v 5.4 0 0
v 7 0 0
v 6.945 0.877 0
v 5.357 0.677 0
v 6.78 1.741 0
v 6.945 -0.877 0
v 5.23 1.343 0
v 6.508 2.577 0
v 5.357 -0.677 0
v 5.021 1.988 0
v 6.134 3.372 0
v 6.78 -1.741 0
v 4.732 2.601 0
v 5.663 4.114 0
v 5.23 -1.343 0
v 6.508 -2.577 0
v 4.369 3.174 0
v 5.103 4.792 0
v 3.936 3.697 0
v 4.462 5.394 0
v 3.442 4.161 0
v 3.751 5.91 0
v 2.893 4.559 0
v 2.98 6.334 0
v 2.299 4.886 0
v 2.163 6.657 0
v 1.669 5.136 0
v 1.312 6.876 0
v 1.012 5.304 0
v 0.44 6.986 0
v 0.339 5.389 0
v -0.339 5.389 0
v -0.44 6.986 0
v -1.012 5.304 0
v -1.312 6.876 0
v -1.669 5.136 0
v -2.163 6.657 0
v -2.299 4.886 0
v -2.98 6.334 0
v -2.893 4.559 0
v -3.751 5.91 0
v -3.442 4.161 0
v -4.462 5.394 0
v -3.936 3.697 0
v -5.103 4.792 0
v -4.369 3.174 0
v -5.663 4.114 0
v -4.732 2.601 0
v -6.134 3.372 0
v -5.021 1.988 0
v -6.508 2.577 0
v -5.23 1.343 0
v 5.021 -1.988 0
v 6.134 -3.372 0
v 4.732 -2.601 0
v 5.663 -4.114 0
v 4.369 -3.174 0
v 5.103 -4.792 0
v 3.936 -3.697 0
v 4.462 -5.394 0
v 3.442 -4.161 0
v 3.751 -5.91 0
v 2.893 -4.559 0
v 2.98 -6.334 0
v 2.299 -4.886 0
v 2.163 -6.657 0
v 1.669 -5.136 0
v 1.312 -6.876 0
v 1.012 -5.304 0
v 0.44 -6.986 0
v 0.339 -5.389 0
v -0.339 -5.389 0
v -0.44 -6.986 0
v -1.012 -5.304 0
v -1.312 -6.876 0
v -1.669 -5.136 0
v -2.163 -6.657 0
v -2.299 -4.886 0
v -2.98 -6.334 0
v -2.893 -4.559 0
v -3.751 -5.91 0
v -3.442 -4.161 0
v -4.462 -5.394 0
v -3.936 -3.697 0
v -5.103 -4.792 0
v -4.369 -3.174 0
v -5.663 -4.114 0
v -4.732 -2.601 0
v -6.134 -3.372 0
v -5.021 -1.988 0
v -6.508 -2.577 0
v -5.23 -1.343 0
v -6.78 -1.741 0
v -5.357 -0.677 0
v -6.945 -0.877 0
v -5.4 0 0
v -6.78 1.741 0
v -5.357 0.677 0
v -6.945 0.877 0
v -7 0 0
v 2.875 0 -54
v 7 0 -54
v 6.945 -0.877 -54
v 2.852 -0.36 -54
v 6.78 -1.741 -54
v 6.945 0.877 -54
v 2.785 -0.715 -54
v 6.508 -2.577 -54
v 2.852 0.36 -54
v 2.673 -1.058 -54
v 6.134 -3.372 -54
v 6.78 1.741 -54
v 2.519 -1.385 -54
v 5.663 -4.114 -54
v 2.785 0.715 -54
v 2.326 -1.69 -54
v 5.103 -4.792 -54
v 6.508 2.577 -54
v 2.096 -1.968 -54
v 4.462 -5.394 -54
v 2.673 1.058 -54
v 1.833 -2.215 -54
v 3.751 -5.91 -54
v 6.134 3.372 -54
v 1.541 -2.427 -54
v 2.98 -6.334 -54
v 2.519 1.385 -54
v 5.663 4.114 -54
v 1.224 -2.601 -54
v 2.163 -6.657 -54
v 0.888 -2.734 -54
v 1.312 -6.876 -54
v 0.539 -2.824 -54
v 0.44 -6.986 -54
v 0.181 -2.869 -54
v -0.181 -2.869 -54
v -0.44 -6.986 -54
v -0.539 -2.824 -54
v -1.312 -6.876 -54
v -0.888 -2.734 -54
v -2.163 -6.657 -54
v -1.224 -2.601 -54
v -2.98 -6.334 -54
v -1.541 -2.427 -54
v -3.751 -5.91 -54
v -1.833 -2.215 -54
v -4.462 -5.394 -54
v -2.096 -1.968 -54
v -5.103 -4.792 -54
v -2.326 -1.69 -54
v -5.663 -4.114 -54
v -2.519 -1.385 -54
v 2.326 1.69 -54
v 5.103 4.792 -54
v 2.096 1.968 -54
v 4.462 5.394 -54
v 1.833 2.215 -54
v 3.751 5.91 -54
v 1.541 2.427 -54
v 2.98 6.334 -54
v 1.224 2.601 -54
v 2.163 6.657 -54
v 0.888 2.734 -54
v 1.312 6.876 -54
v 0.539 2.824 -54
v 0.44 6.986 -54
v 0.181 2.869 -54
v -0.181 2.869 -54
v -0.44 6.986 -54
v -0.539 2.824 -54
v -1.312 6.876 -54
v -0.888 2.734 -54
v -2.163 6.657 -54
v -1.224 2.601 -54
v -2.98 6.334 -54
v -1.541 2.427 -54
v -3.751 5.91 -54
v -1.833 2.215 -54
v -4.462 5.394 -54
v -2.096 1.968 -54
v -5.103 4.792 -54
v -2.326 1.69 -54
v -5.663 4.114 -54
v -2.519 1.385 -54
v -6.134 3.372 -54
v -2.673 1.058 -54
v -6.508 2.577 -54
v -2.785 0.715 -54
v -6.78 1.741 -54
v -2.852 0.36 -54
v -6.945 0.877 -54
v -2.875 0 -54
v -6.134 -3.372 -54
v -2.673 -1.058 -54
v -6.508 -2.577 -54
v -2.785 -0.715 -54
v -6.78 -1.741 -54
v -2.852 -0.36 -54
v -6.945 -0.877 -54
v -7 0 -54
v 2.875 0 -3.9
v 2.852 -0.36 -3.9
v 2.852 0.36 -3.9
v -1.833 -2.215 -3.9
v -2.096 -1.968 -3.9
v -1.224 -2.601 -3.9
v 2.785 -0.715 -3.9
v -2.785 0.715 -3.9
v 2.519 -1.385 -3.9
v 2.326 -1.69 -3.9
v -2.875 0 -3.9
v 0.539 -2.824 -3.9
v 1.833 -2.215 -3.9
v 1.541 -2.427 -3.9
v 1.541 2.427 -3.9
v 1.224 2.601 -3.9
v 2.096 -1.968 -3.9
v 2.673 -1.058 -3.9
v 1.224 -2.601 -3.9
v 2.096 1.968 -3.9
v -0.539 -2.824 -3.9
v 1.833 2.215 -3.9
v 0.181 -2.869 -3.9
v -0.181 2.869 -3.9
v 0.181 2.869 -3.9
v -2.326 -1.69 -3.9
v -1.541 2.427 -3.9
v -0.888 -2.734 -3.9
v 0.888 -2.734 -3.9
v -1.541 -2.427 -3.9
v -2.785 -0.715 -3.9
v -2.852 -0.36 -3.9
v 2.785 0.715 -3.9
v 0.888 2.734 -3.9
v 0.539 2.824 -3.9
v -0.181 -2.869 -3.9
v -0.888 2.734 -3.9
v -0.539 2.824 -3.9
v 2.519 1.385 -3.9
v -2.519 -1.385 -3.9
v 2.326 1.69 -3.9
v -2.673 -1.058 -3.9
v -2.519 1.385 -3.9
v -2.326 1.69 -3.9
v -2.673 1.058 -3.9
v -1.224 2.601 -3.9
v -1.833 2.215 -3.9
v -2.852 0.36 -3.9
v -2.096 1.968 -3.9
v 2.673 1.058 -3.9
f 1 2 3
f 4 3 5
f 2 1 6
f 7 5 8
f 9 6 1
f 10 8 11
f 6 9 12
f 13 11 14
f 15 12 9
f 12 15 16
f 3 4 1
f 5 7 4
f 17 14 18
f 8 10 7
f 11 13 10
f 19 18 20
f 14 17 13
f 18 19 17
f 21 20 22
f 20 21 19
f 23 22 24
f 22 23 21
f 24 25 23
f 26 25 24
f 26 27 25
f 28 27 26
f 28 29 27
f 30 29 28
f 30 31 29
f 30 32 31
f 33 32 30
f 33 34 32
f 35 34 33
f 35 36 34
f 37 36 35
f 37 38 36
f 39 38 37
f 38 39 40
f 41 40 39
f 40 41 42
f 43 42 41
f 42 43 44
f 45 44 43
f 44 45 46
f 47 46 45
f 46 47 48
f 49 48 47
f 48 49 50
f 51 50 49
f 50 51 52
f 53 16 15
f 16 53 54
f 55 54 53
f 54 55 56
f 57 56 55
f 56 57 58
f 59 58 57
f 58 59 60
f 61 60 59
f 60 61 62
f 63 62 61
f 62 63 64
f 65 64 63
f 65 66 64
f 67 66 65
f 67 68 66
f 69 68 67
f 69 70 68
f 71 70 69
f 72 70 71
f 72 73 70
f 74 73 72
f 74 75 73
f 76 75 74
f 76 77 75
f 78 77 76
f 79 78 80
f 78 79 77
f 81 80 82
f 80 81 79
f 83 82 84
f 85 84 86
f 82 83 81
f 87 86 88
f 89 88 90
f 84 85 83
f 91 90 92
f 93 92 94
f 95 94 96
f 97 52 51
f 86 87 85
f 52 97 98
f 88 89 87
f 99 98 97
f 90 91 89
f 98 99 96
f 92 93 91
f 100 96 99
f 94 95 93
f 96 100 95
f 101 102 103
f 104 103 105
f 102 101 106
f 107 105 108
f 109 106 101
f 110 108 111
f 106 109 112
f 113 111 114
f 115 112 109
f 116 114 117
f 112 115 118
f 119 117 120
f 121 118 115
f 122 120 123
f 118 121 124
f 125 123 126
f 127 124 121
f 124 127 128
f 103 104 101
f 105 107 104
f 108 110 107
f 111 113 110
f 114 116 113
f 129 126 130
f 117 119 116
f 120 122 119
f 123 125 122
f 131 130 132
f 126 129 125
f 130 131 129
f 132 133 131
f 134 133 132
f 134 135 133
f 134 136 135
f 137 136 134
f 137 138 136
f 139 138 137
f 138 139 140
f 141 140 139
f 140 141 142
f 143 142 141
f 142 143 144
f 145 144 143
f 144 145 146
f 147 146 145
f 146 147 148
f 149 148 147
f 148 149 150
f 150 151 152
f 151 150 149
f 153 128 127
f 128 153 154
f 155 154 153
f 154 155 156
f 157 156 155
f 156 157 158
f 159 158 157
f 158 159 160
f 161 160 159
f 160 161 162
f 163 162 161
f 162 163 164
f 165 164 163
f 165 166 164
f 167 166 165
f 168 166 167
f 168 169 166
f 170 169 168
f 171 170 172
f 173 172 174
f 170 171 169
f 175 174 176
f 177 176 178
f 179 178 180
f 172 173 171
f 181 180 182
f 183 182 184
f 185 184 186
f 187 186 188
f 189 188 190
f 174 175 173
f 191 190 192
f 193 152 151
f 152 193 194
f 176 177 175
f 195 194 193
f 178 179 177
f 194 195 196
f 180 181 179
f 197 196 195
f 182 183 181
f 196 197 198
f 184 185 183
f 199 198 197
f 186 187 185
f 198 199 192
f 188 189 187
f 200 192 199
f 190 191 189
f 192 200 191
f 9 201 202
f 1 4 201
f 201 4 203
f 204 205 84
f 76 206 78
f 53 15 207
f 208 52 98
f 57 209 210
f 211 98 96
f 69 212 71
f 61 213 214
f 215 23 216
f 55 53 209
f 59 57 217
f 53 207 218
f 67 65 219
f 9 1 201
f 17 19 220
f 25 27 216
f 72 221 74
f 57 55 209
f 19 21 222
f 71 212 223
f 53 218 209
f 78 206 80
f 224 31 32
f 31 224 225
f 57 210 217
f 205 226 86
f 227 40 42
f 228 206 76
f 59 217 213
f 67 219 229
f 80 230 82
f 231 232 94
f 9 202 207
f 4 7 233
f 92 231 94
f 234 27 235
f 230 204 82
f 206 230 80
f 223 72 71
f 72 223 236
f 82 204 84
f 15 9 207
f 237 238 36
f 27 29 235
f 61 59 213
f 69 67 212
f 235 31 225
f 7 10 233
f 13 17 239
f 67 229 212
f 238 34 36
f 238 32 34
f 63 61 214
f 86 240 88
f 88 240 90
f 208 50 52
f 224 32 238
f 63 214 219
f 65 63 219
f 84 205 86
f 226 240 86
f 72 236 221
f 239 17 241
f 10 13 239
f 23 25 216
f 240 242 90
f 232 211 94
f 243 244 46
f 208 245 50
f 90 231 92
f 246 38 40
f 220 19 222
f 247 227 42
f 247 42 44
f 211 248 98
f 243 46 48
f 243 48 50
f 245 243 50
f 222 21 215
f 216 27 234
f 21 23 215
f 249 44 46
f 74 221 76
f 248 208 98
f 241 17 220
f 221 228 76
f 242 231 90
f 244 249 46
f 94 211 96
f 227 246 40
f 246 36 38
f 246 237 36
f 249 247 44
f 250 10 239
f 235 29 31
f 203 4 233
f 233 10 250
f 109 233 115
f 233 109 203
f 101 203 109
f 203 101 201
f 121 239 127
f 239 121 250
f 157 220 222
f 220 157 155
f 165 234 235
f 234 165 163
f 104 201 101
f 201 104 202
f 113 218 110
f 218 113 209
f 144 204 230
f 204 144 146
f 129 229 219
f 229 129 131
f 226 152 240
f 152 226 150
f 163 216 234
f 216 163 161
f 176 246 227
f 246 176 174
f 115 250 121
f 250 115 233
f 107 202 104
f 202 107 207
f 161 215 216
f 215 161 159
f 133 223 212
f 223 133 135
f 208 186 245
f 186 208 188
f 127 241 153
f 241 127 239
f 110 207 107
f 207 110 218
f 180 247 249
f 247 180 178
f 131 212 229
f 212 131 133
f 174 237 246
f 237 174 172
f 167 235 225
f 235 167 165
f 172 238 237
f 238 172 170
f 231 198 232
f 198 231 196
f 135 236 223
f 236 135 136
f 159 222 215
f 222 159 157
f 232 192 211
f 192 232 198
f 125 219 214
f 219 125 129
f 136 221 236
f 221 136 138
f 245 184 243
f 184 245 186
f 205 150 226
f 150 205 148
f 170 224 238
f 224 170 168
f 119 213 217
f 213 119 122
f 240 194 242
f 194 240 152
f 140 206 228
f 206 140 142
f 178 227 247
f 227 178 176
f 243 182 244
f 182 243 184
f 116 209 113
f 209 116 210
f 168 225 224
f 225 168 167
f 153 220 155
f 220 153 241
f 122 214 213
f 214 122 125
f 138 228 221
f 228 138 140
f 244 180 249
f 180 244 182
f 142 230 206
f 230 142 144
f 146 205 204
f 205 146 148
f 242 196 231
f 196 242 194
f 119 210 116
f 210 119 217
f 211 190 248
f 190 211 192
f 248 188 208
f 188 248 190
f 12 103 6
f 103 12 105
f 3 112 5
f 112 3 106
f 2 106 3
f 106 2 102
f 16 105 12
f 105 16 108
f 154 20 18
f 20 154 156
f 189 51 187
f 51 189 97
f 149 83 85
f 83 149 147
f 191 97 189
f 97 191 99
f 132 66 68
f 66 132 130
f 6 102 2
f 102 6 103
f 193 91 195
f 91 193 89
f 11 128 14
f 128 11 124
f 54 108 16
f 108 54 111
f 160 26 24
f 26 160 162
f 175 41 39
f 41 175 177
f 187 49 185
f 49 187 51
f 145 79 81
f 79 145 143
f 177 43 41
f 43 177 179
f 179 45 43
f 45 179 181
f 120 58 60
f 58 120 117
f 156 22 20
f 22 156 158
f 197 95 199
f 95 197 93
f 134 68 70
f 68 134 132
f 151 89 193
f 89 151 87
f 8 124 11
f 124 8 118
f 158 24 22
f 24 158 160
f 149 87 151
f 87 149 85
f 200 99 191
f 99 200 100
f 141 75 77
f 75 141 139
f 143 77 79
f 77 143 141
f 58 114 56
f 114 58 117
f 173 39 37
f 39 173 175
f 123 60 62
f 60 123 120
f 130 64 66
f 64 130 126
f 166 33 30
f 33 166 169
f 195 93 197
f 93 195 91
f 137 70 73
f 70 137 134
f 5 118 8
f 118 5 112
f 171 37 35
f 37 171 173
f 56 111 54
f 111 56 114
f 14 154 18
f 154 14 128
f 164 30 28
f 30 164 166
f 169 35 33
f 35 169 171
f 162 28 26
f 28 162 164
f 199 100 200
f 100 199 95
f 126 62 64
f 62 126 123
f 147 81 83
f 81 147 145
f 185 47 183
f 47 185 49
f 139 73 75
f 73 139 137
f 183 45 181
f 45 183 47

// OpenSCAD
$fn = 50;


difference() {
	union() {
		translate(v = [0, 0, -54.0000000000]) {
			cylinder(h = 54, r = 7.0000000000);
		}
	}
	union() {
		translate(v = [0, 0, 0]) {
			rotate(a = [0, 0, 0]) {
				difference() {
					union() {
						#translate(v = [0, 0, -54.0000000000]) {
							cylinder(h = 54, r = 2.6000000000);
						}
						#translate(v = [0, 0, -3.9000000000]) {
							cylinder(h = 3.9000000000, r = 7.0000000000, r1 = 2.8750000000, r2 = 5.4000000000);
						}
						#translate(v = [0, 0, -54.0000000000]) {
							cylinder(h = 54, r = 2.8750000000);
						}
						#translate(v = [0, 0, -54.0000000000]) {
							cylinder(h = 54, r = 2.6000000000);
						}
					}
					union();
				}
			}
		}
	}
}
